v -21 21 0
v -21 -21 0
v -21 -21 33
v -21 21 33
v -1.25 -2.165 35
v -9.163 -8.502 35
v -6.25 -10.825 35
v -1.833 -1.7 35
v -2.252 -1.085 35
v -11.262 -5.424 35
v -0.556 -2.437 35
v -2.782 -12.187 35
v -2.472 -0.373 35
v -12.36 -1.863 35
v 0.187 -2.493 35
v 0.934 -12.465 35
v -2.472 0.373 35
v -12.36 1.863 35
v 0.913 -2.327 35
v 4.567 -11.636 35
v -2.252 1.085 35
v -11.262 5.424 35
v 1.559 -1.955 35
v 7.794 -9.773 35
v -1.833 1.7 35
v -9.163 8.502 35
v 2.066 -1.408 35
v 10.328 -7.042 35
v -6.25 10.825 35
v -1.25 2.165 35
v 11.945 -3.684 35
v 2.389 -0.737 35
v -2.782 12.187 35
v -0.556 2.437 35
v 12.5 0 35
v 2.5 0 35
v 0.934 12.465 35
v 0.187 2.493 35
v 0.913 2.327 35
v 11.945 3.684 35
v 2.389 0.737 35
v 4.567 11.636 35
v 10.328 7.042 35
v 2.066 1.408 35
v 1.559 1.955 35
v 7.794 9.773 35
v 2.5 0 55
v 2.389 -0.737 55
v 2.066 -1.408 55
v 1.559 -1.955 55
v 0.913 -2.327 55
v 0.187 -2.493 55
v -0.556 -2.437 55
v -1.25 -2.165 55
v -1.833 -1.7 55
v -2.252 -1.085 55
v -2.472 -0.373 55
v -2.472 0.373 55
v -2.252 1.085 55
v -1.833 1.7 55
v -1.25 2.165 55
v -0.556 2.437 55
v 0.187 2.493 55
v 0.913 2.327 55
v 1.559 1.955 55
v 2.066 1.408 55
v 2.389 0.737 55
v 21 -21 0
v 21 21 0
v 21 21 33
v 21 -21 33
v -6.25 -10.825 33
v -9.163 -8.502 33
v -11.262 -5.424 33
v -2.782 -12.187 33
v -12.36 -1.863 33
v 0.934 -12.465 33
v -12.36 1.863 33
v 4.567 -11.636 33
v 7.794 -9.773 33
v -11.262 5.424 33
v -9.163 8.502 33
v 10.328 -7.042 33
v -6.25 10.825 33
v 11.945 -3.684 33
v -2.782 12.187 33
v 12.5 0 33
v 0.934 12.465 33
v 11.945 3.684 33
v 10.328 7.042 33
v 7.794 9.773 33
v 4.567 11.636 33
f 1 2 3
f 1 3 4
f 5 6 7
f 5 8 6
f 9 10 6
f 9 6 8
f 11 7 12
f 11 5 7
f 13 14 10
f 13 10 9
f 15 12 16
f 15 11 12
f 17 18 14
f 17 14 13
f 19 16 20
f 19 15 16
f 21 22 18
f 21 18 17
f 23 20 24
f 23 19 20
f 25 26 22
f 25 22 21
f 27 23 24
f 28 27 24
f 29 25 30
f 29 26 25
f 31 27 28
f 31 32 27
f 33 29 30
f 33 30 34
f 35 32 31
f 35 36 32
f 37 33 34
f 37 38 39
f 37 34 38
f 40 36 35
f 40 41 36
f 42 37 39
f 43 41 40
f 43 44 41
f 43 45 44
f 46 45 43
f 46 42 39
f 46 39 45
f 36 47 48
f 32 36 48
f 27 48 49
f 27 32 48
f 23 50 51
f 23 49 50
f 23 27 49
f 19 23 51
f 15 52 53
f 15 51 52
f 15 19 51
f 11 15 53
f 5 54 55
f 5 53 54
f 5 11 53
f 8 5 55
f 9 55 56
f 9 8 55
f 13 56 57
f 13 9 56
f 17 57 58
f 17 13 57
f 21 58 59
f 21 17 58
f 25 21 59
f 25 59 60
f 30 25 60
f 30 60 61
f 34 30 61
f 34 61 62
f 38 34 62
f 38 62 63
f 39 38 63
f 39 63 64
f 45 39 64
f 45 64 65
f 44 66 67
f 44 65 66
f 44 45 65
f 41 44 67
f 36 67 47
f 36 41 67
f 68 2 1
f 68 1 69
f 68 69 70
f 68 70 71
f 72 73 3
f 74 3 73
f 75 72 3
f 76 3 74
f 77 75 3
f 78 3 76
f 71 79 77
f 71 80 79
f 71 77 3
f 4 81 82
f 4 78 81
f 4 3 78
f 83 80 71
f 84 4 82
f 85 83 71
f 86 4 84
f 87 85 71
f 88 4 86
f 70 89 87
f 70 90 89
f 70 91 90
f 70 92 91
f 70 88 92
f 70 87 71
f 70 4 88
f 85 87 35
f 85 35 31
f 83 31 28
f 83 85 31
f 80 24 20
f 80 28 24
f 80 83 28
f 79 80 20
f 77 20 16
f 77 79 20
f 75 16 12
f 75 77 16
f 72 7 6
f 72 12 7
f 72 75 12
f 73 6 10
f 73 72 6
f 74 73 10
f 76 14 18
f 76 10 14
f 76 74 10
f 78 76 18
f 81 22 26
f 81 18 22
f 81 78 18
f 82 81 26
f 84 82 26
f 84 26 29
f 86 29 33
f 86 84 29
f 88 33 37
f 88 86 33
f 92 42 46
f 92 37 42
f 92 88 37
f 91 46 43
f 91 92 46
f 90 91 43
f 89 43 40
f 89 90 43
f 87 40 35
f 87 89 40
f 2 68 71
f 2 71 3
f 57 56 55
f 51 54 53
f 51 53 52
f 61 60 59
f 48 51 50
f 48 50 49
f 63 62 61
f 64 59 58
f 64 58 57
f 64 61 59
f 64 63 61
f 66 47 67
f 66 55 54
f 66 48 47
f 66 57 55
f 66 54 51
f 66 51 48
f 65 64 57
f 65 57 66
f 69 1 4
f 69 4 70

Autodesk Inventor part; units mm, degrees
ref_plane "YZ Plane" through (0, 0, 0) normal (1, 0, 0) x (0, 1, 0)
ref_plane "XZ Plane" through (0, 0, 0) normal (0, 1, 0) x (-1, 0, 0)
ref_plane "XY Plane" through (0, 0, 0) normal (0, 0, 1) x (1, 0, 0)
sketch "Sketch1" plane through (0, 0, 0) normal (0, 0, 1) x (1, 0, 0)
  line L0 (16.5, 21.5) -> (16.5, 26.5) projected
  line L1 (16.5, 26.5) -> (16.5, 76.5) projected
  line L2 (16.5, 76.5) -> (26.5, 76.5) projected
  line L3 (26.5, 76.5) -> (26.5, 129.5) projected
  line L4 (26.5, 129.5) -> (-26.5, 129.5) projected
  line L5 (-26.5, 129.5) -> (-26.5, 76.5) projected
  line L6 (-26.5, 76.5) -> (-16.5, 76.5) projected
  line L7 (-16.5, 76.5) -> (-16.5, 26.5) projected
  line L8 (-16.5, 26.5) -> (-16.5, 21.5) projected
  line L9 (-16.5, 21.5) -> (-21.5, 21.5) projected
  line L10 (-21.5, 21.5) -> (-21.5, 11.5) projected
  line L11 (-21.5, 11.5) -> (-26.5, 11.5) projected
  line L12 (-26.5, 11.5) -> (-26.5, -11.5) projected
  line L13 (-26.5, -11.5) -> (-21.5, -11.5) projected
  line L14 (-21.5, -11.5) -> (-21.5, -21.5) projected
  line L15 (-21.5, -21.5) -> (-16.5, -21.5) projected
  line L16 (-16.5, -21.5) -> (-16.5, -26.5) projected
  line L17 (-16.5, -26.5) -> (-16.5, -76.5) projected
  line L18 (-16.5, -76.5) -> (-26.5, -76.5) projected
  line L19 (-26.5, -76.5) -> (-26.5, -129.5) projected
  line L20 (-26.5, -129.5) -> (26.5, -129.5) projected
  line L21 (26.5, -129.5) -> (26.5, -76.5) projected
  line L22 (26.5, -76.5) -> (16.5, -76.5) projected
  line L23 (16.5, -76.5) -> (16.5, -26.5) projected
  line L24 (16.5, -26.5) -> (16.5, -21.5) projected
  line L25 (16.5, -21.5) -> (21.5, -21.5) projected
  line L26 (21.5, -21.5) -> (21.5, -11.5) projected
  line L27 (21.5, -11.5) -> (26.5, -11.5) projected
  line L28 (26.5, -11.5) -> (26.5, 11.5) projected
  line L29 (26.5, 11.5) -> (21.5, 11.5) projected
  line L30 (21.5, 11.5) -> (21.5, 21.5) projected
  line L31 (21.5, 21.5) -> (16.5, 21.5) projected
  circle A0 centre (0, -103) radius 10.5 projected
  circle A1 centre (0, 103) radius 10.5 projected
  line L32 (-11.5, 26.5) -> (-11.5, 76.5) projected
  line L33 (-11.5, 76.5) -> (11.5, 76.5) projected
  line L34 (11.5, 76.5) -> (11.5, 26.5) projected
  line L35 (11.5, 26.5) -> (-11.5, 26.5) projected
  line L36 (11.5, -26.5) -> (11.5, -76.5) projected
  line L37 (11.5, -76.5) -> (-11.5, -76.5) projected
  line L38 (-11.5, -76.5) -> (-11.5, -26.5) projected
  line L39 (-11.5, -26.5) -> (11.5, -26.5) projected
  line L40 (-21, 21) -> (21, 21)
  line L41 (21, 21) -> (21, -21)
  line L42 (21, -21) -> (-21, -21)
  line L43 (-21, -21) -> (-21, 21)
  line L44 (-21, 21) -> (21, -21) construction
  line L45 (21, 21) -> (-21, -21) construction
  point P0 (0, 0)
  dimension "d0" = 42
  dimension "d1" = 42
extrude "Extrusion1" add sketch "Sketch1" along normal blind 33 contours L40 L41 L42 L43
sketch "Sketch2" plane through (0, 0, 33) normal (0, 0, 1) x (1, 0, 0)
  circle A0 centre (0, 0) radius 12.5
  dimension "d4" = 25
extrude "Extrusion2" add sketch "Sketch2" along normal blind 2
sketch "Sketch3" plane through (0, 0, 35) normal (0, 0, 1) x (1, 0, 0)
  circle A0 centre (0, 0) radius 2.5
  dimension "d7" = 5
extrude "Extrusion3" add sketch "Sketch3" along normal blind 20
properties part number "motor_sample"
